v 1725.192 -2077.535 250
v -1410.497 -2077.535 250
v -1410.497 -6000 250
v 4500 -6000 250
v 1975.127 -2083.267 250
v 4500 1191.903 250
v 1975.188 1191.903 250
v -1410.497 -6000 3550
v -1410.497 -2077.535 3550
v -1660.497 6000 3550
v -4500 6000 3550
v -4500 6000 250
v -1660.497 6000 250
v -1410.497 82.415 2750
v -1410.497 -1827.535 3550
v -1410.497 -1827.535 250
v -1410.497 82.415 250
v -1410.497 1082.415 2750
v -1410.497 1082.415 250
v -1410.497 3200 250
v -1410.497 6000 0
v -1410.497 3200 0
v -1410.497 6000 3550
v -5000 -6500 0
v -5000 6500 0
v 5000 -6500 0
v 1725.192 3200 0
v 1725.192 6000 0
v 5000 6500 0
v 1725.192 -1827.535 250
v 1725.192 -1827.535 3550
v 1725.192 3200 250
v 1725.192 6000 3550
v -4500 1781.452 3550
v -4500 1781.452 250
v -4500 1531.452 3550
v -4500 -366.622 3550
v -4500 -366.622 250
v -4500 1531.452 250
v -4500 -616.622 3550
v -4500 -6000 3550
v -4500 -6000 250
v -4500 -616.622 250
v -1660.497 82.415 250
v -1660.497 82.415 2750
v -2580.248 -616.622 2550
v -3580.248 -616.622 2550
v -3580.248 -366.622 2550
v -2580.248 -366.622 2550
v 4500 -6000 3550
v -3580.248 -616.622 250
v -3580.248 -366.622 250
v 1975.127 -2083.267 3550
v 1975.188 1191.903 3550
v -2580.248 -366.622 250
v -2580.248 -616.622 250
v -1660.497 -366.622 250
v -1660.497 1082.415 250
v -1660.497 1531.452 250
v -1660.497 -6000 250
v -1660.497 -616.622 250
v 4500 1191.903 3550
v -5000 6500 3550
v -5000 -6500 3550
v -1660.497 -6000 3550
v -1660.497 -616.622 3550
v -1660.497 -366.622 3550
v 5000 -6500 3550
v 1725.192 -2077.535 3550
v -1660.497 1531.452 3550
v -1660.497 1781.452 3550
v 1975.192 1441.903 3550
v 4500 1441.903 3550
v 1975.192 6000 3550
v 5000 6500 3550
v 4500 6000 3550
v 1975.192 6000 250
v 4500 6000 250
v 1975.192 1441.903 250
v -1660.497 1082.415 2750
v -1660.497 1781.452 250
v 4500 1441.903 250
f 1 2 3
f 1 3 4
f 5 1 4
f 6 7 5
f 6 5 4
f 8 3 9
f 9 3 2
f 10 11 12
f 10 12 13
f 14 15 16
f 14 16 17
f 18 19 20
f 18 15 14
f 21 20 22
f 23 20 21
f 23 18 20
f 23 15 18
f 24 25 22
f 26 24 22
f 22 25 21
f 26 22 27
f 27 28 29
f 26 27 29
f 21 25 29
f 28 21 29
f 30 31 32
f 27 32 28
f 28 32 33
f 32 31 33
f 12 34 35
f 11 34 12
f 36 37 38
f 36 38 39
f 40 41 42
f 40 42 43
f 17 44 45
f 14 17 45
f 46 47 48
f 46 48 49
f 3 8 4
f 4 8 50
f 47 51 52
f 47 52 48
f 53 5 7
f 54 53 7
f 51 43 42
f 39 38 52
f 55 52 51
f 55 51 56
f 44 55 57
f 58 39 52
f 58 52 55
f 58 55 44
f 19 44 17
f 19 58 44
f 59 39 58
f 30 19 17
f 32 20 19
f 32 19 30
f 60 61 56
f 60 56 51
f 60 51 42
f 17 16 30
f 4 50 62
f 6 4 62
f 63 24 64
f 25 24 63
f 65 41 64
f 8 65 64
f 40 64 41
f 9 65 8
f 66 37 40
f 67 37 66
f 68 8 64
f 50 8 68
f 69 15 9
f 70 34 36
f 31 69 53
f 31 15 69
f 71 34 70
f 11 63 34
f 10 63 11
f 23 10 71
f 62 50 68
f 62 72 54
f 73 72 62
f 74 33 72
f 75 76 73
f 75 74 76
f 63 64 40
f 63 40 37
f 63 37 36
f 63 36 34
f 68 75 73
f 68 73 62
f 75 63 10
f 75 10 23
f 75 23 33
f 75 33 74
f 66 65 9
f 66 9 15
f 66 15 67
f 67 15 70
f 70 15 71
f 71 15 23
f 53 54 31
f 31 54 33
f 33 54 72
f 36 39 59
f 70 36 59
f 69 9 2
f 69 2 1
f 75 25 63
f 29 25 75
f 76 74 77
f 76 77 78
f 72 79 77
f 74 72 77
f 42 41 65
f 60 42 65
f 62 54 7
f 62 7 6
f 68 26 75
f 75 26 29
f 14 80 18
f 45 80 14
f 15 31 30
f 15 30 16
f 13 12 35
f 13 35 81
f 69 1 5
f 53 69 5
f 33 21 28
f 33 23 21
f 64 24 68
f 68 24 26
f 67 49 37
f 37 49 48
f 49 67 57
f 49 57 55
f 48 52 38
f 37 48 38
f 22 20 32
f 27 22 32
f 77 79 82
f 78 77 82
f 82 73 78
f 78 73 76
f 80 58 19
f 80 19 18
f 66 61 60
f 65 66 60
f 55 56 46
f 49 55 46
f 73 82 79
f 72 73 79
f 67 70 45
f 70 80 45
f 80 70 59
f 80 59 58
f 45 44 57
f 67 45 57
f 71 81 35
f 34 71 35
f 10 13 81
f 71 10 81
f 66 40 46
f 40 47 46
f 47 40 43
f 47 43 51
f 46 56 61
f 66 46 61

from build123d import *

# Parameters (mm, degrees)
F0_W      = 10000
F0_H      = 13000
F1_DEPTH  = 3550
F2_W      = 9000
F2_H      = 12000
F3_DEPTH  = 3300
F5_DEPTH  = 3300
F6_W      = 1000
F6_H      = 2300
F7_DEPTH  = 250
F8_W      = 1000
F8_H      = 2500
F9_DEPTH  = 250
F10_W     = 3135.6891602224
F10_H     = 2800
F11_DEPTH = 250


# Not quite as in the source:
# - a feature names something its author has since deleted; it is built from what else it names


with BuildPart() as f1:
    # F0 (on Top) → F1 (new body)
    with BuildSketch(Plane.XY):
        Rectangle(F0_W, F0_H)
    extrude(amount=F1_DEPTH)

    # F2 (on face) → F3 (cut)
    with BuildSketch(Plane.XY.offset(3550)):
        Rectangle(F2_W, F2_H)
    extrude(amount=-F3_DEPTH, mode=Mode.SUBTRACT)

    # F4 (on face) → F5 (join)
    with BuildSketch(Plane.XY.offset(250)):
        Polygon((-1660.4968309402, -366.6217029095), (-4500, -366.6217029095), (-4500, -616.6217029095), (-1660.4968309402, -616.6217029095), (-1660.4968309402, -6000), (-1410.4968309402, -6000), (-1410.4968309402, -2077.5351682588), (1725.1923292822, -2077.5351682588), (1975.1266148544, -2083.2669128011), (1975.1876689086, 1191.9026374817), (4500, 1191.9026374817), (4500, 1441.9026374817), (1975.1923292822, 1441.9026374817), (1975.1923292822, 6000), (1725.1923292822, 6000), (1725.1923292822, 1441.9026374817), (1725.1923292822, -1827.5351682588), (-1410.4968309402, -1827.5351682588), (-1410.4968309402, 6000), (-1660.4968309402, 6000), (-1660.4968309402, 1781.4515829086), (-4500, 1781.4515829086), (-4500, 1531.4515829086), (-1660.4968309402, 1531.4515829086), align=None)
    extrude(amount=F5_DEPTH)

    # F6 (on face) → F7 (cut)
    with BuildSketch(Plane.XZ.offset(616.6217029095)):
        with Locations((-3080.2484154701, 1400)):
            Rectangle(F6_W, F6_H)
    extrude(amount=-F7_DEPTH, mode=Mode.SUBTRACT)

    # F8 (on face) → F9 (cut, through all)
    with BuildSketch(Plane(origin=(-1660.4968309402, 0, 0), x_dir=(0, -1, 0), z_dir=(-1, 0, 0))):
        with Locations((-582.4149399996, 1500)):
            Rectangle(F8_W, F8_H)
    extrude(amount=-F9_DEPTH, mode=Mode.SUBTRACT)

    # F10 (on face) → F11 (cut, through all)
    with BuildSketch(Plane.XY.offset(250)):
        with Locations((157.347749171, 4600)):
            Rectangle(F10_W, F10_H)
    extrude(amount=-F11_DEPTH, mode=Mode.SUBTRACT)


solid = f1.part
